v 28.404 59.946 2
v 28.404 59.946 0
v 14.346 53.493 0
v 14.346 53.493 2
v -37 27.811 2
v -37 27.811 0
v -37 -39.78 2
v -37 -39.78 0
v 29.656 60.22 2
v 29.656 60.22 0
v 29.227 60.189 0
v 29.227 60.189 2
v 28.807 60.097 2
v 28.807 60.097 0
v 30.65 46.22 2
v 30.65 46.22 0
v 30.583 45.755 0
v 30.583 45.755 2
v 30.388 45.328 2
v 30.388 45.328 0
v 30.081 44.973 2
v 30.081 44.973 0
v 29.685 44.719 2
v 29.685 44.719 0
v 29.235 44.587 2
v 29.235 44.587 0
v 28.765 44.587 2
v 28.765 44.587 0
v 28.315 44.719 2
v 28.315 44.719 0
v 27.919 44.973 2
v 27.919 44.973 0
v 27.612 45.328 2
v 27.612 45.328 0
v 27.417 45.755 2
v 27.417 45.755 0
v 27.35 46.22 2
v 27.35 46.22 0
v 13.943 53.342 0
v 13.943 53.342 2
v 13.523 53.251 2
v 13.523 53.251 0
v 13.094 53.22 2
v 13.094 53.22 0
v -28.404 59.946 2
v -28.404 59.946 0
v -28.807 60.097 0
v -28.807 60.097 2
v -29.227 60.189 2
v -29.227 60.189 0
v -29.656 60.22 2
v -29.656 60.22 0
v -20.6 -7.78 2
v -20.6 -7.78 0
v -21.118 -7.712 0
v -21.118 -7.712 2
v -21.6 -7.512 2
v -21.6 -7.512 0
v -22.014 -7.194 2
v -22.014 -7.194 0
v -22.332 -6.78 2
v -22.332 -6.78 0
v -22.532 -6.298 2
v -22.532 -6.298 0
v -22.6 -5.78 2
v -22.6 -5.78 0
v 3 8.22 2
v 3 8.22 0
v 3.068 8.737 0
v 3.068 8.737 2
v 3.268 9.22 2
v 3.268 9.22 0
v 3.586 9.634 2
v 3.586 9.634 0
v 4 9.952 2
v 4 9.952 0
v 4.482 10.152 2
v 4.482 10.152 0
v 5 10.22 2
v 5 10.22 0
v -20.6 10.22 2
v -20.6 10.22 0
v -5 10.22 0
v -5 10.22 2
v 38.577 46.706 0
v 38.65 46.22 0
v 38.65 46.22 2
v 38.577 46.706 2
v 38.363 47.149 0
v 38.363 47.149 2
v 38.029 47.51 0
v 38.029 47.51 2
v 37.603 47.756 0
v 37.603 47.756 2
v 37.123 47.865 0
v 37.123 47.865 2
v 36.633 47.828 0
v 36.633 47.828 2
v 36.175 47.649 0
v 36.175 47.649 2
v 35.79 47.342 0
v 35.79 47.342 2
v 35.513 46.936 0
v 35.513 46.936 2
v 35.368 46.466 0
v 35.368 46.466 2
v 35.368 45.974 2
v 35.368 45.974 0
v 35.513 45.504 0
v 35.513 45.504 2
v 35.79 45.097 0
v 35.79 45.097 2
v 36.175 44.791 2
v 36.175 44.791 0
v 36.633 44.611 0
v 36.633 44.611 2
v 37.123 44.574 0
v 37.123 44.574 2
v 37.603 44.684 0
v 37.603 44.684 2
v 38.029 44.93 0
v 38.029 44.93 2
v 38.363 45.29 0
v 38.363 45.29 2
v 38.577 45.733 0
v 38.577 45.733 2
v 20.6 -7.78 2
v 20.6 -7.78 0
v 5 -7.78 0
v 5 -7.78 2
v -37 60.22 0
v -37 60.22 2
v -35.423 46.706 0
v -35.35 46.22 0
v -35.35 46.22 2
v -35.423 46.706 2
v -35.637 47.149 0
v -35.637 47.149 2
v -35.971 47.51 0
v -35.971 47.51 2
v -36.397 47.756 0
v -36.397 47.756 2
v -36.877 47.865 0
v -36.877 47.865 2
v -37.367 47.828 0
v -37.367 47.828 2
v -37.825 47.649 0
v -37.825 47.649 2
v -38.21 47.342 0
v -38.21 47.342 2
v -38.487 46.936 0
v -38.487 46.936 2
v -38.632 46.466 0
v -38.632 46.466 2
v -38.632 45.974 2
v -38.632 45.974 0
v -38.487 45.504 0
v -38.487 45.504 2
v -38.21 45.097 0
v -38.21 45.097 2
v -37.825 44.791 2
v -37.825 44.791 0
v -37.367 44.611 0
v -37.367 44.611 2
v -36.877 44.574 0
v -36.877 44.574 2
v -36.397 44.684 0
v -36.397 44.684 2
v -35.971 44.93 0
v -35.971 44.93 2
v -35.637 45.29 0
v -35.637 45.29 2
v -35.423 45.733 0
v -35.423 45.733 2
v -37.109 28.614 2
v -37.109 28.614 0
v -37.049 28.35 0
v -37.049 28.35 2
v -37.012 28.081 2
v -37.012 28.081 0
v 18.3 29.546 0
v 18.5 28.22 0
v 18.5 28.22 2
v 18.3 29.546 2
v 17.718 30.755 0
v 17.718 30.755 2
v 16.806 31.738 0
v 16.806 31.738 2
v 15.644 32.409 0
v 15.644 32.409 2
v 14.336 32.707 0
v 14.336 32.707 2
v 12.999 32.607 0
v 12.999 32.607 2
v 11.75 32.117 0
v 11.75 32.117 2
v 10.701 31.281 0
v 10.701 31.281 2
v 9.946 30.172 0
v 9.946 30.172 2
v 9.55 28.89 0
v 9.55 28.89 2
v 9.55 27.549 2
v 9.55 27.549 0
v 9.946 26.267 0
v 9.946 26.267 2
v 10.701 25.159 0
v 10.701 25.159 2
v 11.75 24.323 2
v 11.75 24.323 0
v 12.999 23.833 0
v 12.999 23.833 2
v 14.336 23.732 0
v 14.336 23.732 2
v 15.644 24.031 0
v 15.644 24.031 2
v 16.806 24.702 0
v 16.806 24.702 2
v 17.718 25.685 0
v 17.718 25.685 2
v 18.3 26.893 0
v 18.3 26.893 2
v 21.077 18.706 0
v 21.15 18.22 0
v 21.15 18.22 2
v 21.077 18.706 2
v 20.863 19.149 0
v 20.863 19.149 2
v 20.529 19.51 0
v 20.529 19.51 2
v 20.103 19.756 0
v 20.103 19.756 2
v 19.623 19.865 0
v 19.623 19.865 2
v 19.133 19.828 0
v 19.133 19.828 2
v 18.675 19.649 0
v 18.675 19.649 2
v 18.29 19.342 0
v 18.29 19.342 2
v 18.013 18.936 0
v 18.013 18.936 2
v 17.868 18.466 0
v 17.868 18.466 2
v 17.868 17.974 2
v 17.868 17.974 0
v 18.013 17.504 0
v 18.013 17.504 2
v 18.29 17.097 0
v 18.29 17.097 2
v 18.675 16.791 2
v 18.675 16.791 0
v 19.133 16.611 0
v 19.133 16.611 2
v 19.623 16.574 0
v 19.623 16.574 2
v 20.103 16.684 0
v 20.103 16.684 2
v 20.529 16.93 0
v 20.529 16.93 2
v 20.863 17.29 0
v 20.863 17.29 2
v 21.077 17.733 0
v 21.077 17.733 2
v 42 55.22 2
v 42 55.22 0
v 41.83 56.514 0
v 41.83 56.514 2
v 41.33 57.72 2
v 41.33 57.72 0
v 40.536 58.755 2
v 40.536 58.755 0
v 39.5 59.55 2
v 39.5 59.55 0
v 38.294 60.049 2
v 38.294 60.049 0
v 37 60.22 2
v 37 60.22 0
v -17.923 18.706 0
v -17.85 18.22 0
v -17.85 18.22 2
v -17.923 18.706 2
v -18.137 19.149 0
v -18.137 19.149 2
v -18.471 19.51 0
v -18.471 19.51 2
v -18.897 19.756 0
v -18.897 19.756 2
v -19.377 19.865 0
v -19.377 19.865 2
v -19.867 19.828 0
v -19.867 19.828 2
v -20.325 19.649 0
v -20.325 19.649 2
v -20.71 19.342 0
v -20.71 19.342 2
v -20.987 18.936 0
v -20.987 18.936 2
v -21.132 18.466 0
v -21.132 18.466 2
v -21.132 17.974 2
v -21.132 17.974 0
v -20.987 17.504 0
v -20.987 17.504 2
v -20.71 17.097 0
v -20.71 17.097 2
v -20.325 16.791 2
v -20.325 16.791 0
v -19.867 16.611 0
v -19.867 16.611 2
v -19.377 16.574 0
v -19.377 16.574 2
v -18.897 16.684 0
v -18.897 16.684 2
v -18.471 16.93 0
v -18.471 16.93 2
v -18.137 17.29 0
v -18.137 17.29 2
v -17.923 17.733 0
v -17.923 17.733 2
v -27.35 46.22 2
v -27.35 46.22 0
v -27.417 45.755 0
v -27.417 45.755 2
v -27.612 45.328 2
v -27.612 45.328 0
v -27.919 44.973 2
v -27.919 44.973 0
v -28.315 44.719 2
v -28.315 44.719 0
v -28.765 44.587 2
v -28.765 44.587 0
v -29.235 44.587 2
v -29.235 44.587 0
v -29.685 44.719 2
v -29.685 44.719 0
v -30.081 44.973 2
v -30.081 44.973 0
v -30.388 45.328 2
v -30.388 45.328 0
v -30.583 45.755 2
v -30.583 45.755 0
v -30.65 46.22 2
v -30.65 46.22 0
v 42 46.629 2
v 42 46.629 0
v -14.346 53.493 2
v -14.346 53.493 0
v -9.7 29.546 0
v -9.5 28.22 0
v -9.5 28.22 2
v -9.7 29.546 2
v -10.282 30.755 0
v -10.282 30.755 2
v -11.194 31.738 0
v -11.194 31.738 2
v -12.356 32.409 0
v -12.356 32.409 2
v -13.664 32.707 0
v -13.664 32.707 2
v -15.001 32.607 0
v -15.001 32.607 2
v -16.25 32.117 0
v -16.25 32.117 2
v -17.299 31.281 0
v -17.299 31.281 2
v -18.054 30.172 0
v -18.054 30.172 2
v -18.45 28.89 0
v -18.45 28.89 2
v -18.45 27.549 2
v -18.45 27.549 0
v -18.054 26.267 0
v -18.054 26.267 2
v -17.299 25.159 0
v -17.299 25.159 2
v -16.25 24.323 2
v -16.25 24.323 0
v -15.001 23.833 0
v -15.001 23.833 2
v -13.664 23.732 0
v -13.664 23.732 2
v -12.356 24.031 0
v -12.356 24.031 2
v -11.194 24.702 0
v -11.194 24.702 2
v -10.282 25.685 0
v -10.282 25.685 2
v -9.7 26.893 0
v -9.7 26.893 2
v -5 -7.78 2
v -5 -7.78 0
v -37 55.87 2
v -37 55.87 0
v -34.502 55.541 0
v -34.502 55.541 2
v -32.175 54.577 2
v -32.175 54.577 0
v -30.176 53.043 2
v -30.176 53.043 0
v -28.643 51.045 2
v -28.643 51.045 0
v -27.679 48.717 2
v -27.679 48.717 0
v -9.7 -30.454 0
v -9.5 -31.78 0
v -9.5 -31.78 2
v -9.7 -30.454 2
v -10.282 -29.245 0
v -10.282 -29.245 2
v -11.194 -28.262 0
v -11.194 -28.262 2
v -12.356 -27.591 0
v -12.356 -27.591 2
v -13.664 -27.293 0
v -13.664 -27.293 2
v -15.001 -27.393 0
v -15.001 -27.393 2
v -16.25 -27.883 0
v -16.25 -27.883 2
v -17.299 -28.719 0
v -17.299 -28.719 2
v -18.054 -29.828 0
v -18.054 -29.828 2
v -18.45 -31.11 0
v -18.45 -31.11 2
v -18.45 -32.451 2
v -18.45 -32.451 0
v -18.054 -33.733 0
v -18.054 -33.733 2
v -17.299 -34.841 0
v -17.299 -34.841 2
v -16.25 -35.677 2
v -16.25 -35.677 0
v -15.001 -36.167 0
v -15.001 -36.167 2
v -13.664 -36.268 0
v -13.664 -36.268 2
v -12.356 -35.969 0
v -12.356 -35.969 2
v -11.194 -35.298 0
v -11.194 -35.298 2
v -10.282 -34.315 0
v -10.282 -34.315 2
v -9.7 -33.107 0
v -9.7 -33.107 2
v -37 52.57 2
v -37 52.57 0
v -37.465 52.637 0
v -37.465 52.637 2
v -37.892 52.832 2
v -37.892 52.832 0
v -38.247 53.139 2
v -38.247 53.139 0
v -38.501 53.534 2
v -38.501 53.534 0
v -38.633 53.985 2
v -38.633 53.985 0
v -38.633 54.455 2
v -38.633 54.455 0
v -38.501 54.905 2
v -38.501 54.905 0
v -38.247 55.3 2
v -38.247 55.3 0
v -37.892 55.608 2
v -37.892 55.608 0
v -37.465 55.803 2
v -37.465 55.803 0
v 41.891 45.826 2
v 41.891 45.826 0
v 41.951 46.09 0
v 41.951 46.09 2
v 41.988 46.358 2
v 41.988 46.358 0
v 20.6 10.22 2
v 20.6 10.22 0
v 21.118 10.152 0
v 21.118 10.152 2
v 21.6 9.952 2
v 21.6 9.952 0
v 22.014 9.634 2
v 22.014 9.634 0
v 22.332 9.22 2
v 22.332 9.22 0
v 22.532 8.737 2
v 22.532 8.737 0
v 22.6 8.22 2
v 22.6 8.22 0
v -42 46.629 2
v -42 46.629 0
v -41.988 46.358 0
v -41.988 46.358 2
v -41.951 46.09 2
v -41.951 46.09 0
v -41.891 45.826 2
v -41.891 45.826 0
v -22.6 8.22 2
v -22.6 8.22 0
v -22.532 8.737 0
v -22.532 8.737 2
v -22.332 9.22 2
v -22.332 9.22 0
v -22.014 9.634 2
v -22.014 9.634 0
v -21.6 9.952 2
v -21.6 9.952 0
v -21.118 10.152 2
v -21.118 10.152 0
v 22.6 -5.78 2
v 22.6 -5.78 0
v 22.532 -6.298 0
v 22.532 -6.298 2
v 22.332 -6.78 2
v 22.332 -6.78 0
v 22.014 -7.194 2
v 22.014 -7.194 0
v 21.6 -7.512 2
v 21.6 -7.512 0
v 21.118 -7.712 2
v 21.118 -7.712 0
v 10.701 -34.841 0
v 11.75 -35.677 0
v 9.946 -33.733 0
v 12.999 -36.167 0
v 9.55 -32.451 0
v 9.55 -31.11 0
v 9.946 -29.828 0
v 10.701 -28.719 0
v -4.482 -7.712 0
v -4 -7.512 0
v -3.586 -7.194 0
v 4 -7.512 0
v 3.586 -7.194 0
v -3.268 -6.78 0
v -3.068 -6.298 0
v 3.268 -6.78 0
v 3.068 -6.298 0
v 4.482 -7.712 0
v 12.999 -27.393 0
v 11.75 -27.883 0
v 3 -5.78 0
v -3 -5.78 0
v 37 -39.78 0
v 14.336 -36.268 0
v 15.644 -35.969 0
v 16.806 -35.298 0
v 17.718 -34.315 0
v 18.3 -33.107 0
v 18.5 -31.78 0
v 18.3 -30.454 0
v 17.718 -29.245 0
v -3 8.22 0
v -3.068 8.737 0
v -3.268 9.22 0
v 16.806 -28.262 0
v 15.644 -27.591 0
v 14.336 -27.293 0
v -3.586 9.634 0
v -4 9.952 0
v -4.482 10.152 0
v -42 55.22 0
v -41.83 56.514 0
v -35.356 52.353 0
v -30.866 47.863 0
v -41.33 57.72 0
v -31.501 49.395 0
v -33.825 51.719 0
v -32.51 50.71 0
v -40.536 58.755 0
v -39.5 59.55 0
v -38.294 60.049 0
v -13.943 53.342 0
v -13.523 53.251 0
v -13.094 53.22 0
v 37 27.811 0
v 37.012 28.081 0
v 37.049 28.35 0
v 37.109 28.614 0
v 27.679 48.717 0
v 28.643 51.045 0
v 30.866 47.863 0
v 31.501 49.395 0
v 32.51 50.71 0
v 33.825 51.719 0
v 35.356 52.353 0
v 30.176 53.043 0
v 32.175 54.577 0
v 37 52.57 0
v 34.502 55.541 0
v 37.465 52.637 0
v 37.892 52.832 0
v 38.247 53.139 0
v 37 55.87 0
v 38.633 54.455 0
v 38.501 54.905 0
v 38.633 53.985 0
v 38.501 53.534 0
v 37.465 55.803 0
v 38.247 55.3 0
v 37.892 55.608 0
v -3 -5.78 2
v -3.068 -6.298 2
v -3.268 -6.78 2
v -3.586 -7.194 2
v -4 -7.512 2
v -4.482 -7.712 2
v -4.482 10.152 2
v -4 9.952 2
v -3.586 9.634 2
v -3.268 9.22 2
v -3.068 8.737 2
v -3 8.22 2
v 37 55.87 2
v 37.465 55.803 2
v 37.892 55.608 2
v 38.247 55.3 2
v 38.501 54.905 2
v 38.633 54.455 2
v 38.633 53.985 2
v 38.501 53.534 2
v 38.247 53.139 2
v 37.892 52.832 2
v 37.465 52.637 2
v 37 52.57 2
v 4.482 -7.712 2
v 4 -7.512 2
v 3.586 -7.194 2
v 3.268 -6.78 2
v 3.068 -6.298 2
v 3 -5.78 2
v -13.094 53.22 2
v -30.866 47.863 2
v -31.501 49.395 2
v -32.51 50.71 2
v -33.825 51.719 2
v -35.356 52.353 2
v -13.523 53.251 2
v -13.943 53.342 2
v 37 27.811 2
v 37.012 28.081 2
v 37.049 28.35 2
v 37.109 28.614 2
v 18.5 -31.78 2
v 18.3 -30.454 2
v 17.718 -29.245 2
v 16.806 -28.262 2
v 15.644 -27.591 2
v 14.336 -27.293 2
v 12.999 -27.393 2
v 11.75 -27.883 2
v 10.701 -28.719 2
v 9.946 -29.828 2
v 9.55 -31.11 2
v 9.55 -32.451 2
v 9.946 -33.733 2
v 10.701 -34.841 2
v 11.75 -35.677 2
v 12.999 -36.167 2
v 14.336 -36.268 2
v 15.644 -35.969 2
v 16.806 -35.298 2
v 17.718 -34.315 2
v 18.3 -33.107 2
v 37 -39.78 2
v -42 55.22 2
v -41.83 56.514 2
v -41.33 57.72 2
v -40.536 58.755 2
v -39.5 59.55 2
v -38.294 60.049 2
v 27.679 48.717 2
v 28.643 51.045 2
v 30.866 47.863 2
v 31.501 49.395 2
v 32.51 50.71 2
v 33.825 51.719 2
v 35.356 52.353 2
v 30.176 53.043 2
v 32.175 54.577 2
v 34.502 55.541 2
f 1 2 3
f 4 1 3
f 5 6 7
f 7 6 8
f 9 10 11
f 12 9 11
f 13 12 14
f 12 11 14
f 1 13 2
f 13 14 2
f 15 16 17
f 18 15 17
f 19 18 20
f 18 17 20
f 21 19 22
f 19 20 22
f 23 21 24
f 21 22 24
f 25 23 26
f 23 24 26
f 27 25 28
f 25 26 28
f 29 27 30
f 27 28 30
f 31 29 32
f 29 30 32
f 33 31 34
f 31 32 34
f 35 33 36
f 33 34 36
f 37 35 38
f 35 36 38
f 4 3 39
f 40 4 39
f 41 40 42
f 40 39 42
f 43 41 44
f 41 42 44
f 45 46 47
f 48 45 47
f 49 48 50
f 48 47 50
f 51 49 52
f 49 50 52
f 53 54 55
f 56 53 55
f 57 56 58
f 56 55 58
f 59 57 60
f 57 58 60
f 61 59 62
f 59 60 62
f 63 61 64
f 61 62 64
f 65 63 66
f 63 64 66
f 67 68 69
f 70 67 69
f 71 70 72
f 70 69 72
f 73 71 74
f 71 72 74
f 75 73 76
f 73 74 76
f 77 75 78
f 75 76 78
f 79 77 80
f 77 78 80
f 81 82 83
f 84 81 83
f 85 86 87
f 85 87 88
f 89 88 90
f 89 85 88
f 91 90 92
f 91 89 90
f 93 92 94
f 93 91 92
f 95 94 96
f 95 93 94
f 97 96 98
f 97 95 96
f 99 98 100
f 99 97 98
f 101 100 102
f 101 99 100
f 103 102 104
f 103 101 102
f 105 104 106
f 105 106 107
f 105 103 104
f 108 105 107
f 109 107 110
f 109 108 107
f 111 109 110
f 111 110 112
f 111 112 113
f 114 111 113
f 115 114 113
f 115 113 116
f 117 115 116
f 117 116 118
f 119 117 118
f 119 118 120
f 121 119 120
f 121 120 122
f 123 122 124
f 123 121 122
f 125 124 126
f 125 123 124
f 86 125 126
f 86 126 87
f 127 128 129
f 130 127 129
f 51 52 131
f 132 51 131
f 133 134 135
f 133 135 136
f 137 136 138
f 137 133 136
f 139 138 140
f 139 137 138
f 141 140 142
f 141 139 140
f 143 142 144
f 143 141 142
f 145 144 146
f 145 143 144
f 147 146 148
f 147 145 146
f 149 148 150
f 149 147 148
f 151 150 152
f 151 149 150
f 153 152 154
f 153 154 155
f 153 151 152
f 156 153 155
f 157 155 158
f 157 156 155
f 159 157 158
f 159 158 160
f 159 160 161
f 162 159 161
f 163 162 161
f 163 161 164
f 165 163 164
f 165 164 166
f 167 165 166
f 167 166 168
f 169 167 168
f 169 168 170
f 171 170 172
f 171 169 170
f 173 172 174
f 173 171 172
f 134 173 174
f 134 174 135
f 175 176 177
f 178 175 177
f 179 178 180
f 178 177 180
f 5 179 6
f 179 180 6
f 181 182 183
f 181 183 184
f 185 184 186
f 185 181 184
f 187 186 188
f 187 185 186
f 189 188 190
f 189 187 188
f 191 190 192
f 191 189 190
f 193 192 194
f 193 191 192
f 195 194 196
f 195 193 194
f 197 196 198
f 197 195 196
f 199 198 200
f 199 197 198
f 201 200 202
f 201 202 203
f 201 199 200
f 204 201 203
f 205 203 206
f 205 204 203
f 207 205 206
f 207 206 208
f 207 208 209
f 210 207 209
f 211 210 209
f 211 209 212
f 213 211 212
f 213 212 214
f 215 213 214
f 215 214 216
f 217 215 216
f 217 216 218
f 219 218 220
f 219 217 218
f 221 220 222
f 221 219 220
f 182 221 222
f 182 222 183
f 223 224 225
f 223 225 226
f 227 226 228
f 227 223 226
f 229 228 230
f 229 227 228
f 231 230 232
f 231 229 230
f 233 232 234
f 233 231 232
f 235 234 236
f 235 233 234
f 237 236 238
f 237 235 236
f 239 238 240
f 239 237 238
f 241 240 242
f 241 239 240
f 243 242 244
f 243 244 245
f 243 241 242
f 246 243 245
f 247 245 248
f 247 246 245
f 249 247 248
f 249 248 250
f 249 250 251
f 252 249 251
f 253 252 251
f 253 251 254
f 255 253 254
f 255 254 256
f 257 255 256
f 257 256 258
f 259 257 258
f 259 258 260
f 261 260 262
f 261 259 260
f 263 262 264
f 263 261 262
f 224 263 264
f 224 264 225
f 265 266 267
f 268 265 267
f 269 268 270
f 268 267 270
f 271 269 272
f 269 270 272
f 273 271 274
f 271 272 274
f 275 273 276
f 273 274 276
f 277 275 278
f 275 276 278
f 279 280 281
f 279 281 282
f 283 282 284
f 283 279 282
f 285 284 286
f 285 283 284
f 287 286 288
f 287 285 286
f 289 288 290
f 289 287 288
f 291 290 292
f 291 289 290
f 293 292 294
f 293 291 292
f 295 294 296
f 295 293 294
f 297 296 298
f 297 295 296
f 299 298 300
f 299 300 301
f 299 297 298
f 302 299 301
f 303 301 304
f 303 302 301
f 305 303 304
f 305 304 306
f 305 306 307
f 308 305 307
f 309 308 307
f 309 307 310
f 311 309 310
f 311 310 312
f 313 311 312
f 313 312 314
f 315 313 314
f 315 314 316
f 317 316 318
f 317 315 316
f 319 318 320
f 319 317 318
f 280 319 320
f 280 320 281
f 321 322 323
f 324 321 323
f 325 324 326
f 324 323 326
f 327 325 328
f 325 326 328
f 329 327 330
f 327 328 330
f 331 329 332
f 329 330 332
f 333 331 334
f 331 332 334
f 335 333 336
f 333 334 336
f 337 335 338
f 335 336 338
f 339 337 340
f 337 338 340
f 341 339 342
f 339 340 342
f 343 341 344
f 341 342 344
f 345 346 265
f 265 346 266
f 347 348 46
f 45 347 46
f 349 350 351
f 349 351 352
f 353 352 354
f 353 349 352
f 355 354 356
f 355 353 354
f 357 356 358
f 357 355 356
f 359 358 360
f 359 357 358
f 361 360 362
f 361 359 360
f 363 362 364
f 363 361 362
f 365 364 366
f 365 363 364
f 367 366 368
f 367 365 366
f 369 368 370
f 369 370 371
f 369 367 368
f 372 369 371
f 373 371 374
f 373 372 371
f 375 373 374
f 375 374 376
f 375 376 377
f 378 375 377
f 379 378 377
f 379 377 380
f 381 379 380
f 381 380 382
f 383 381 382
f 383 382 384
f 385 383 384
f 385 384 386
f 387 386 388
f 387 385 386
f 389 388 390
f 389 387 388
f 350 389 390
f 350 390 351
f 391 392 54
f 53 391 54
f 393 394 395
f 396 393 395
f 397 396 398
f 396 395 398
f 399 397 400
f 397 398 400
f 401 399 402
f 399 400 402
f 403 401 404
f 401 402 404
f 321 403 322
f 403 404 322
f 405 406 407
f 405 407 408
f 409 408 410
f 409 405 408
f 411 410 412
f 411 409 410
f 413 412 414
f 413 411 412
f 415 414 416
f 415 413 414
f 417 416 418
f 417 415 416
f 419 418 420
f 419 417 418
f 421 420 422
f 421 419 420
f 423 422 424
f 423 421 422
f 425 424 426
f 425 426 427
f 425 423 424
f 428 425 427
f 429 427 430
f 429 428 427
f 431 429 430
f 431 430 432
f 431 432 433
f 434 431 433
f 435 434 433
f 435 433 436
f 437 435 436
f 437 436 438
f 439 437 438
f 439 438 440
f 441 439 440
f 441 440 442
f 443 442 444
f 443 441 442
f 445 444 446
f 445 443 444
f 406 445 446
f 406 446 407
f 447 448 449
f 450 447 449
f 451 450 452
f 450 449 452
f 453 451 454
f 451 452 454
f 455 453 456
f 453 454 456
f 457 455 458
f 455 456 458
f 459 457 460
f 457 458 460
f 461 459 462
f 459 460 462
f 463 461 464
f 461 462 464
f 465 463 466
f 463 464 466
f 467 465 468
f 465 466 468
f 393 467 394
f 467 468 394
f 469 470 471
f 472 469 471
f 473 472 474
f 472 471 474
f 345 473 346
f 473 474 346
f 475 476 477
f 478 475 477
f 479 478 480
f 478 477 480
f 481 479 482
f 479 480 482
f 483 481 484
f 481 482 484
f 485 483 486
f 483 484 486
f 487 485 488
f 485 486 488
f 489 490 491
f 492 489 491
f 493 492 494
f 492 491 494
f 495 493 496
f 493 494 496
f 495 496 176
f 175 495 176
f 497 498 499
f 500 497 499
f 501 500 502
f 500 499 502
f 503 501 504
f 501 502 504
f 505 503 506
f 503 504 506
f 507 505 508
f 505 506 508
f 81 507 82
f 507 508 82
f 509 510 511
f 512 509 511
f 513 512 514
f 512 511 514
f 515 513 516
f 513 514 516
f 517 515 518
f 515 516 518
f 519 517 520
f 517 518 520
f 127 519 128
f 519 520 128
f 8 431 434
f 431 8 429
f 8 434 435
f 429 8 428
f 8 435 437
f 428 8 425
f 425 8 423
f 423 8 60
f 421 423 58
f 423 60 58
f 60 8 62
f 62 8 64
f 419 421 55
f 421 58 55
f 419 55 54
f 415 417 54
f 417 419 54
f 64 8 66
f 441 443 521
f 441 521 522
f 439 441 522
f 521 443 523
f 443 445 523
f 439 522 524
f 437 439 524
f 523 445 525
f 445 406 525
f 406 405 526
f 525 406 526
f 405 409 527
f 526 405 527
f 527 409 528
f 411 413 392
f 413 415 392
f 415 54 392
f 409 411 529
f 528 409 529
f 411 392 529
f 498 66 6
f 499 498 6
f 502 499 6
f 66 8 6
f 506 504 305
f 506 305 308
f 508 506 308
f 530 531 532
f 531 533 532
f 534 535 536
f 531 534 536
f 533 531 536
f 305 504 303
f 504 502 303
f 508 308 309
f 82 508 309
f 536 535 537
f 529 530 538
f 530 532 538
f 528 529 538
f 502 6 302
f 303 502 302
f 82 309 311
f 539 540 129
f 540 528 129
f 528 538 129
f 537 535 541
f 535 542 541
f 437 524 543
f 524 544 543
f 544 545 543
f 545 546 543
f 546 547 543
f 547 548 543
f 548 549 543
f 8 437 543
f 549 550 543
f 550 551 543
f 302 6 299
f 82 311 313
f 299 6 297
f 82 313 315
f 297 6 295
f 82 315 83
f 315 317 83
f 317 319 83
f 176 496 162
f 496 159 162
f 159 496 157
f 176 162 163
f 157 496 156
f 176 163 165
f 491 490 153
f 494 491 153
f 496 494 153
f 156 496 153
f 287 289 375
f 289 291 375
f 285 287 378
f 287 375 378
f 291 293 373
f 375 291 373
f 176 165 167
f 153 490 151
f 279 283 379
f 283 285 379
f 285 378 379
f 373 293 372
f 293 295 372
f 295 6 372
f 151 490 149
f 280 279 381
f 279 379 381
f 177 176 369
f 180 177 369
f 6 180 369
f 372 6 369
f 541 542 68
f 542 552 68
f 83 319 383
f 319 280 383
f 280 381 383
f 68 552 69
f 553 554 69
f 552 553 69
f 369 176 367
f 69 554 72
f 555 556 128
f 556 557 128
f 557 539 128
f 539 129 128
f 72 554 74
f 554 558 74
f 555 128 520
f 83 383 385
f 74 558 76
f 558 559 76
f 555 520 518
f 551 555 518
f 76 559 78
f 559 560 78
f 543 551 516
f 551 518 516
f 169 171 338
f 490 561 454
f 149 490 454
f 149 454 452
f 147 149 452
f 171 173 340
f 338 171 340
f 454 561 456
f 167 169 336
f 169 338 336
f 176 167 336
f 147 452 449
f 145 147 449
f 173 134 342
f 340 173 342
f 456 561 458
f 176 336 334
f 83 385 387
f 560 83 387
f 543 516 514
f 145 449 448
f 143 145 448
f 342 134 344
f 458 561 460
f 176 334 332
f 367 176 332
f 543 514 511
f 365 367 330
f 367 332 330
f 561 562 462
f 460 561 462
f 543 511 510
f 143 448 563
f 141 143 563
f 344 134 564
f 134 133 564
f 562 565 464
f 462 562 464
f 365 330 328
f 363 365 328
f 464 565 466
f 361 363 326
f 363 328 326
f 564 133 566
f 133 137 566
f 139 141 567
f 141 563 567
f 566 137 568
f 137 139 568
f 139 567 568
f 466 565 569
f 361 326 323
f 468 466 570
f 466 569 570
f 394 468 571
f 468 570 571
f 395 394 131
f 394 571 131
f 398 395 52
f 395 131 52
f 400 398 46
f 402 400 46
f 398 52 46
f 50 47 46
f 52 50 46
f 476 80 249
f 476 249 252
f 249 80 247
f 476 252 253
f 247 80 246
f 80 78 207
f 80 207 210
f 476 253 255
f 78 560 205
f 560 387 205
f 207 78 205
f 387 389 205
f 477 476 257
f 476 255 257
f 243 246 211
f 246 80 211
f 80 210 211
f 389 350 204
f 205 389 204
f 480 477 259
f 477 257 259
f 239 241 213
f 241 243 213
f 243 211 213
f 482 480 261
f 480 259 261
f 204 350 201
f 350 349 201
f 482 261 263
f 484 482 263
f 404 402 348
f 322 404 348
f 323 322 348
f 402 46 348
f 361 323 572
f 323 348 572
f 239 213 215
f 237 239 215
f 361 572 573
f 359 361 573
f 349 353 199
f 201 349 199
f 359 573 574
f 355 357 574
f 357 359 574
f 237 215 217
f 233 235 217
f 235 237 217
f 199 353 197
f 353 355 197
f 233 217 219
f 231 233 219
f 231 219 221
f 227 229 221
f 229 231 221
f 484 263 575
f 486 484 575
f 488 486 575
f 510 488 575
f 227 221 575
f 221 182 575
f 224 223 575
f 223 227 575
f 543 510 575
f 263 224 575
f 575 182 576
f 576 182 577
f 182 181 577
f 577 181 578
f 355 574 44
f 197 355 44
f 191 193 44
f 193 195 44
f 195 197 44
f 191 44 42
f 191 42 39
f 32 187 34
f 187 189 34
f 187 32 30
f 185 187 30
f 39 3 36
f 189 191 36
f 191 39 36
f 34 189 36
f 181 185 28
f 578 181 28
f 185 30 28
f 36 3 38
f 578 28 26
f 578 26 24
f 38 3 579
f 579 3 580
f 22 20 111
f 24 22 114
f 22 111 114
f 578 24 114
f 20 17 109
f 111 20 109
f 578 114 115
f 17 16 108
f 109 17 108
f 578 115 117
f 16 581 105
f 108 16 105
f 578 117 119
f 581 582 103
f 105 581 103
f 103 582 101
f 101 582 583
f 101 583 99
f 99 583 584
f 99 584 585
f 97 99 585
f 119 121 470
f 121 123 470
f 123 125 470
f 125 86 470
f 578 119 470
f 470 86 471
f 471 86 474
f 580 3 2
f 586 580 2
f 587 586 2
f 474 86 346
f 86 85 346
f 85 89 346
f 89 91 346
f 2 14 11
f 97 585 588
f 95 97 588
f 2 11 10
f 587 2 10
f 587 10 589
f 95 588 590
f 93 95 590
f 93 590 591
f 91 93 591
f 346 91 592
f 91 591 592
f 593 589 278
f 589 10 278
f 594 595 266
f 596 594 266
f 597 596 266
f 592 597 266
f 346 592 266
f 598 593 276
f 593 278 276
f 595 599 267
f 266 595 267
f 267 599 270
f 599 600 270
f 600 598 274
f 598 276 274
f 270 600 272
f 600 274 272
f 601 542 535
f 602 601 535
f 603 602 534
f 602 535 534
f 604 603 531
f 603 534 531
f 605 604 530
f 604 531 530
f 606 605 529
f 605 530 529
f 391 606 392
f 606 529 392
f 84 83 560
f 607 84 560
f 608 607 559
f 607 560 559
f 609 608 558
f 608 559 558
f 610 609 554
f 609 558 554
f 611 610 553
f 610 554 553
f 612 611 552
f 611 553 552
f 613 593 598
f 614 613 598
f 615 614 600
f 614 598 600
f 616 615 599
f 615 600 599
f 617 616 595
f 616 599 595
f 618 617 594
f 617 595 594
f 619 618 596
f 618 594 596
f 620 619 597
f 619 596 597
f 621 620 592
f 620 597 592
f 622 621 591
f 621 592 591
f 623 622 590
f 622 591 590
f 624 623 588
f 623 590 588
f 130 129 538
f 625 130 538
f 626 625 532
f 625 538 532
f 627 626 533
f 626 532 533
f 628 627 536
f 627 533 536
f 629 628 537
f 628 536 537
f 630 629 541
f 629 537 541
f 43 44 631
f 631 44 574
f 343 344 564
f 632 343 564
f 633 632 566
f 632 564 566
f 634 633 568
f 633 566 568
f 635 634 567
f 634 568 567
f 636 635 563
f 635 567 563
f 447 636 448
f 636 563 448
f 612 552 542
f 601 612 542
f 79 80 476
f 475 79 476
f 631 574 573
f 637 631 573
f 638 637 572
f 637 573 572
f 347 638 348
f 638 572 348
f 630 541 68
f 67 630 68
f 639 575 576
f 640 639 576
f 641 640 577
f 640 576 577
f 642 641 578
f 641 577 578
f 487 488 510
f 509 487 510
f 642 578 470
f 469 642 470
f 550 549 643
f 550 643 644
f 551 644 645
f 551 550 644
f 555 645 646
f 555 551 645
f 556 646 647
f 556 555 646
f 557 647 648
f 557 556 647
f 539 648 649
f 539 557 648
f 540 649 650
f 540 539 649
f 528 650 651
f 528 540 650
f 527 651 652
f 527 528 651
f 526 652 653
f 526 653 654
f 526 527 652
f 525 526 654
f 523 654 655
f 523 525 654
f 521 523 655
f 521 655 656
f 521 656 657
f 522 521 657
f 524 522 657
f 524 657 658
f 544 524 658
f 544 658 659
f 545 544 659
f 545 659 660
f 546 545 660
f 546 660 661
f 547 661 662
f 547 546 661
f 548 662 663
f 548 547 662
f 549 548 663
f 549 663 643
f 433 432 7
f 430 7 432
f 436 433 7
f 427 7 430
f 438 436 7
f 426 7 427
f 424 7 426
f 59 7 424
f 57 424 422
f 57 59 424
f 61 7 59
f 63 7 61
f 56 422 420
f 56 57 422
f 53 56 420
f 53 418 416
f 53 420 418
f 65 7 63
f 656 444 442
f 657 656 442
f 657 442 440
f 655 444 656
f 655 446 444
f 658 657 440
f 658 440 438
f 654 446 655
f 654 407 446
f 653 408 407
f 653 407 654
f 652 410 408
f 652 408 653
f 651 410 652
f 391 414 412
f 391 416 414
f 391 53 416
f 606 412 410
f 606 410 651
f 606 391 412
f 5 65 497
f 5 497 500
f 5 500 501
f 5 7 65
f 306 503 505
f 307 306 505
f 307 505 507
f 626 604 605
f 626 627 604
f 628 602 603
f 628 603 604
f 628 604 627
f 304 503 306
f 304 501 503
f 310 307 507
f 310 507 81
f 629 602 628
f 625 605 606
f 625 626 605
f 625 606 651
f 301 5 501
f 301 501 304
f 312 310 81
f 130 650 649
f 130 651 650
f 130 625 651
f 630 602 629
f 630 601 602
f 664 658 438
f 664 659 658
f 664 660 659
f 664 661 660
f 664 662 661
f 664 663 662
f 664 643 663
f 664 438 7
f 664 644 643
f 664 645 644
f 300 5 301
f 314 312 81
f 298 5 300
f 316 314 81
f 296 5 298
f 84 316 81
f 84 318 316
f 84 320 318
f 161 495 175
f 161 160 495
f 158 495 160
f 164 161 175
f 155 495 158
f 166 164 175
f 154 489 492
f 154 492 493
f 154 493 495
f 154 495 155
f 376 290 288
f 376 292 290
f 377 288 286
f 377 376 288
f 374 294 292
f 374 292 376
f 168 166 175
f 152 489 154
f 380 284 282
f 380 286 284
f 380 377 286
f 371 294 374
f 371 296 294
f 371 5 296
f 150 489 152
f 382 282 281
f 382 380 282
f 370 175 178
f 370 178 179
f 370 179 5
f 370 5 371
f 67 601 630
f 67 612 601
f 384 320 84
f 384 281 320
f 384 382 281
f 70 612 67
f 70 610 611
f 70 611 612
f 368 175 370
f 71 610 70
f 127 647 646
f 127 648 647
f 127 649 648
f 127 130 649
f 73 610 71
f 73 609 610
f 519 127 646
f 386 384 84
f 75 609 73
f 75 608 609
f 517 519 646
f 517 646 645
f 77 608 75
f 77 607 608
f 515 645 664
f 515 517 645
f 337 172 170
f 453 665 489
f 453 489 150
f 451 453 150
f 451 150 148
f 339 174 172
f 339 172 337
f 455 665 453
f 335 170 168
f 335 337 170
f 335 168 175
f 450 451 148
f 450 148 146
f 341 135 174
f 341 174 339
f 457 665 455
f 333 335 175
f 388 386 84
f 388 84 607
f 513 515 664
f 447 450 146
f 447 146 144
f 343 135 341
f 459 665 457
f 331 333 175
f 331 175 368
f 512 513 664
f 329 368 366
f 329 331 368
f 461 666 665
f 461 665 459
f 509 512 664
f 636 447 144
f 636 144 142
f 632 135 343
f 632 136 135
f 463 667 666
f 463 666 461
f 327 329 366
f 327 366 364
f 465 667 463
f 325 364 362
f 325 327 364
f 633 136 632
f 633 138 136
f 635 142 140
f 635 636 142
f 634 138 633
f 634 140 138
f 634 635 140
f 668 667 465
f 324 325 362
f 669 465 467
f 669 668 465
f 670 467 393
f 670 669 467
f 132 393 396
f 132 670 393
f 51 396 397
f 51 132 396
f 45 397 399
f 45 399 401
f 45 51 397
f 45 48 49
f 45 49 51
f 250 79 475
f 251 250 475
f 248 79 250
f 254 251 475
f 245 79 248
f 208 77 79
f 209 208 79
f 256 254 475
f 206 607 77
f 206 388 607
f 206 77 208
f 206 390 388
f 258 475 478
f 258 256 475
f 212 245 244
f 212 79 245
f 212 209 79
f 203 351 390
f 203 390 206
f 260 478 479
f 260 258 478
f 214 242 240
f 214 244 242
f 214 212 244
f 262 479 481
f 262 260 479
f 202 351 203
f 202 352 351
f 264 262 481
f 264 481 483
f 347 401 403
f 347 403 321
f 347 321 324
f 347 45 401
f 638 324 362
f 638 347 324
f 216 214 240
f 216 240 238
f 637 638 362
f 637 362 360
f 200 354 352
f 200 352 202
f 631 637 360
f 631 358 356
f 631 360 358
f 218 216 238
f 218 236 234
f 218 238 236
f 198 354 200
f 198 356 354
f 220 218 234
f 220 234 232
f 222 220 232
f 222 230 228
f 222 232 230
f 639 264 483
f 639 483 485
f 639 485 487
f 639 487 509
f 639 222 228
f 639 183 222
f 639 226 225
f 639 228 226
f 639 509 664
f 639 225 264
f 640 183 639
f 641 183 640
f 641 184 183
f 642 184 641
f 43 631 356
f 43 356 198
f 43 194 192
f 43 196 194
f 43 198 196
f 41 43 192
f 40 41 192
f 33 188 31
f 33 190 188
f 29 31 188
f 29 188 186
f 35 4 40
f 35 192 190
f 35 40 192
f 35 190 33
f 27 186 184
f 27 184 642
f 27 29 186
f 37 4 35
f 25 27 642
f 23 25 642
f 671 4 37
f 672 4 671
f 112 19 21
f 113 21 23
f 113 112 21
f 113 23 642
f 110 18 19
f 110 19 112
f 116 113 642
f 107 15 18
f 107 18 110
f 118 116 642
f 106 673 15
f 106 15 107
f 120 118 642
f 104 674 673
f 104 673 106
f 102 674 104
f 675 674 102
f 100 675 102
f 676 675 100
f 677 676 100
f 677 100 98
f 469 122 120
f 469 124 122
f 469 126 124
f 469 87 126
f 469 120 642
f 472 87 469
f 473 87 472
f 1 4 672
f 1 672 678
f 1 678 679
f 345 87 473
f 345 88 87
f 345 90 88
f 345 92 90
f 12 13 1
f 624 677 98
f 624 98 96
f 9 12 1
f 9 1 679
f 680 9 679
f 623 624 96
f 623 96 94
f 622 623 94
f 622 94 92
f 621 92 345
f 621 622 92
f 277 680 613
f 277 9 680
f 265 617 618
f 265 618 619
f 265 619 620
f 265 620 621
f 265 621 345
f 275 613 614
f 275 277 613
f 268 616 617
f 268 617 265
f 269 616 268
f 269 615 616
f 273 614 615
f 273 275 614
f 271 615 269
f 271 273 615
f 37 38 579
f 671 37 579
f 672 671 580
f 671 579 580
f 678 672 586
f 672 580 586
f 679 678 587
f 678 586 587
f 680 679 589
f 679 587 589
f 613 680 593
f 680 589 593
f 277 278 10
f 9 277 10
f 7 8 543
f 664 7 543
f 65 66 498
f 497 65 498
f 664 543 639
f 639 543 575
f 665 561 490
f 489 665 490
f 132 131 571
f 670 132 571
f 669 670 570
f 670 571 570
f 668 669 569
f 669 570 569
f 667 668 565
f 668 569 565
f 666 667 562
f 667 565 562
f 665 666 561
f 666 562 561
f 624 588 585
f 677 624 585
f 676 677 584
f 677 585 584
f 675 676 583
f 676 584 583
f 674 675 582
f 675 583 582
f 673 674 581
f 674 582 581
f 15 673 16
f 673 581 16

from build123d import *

# Parameters (mm, degrees)
F0_R     = 4.5
F0_R_2   = 1.65
F1_DEPTH = 2


with BuildPart() as f1:
    # F0 (on Top) → F1 (new body)
    with BuildSketch(Plane.XY):
        with BuildLine():
            Line((-29.655639, 60.219758), (-37, 60.219758))
            ThreePointArc((-37, 60.219758), (-40.535534, 58.755292), (-42, 55.219758))
            Line((-42, 55.219758), (-42, 46.628683))
            ThreePointArc((-42, 46.628683), (-41.972513, 46.223505), (-41.890554, 45.825751))
            Line((-41.890554, 45.825751), (-37.109446, 28.613764))
            ThreePointArc((-37.109446, 28.613764), (-37.027487, 28.216011), (-37, 27.810833))
            Line((-37, 27.810833), (-37, -39.780242))
            Line((-37, -39.780242), (37, -39.780242))
            Line((37, -39.780242), (37, 27.810833))
            ThreePointArc((37, 27.810833), (37.027487, 28.216011), (37.109446, 28.613764))
            Line((37.109446, 28.613764), (41.890554, 45.825751))
            ThreePointArc((41.890554, 45.825751), (41.972513, 46.223505), (42, 46.628683))
            Line((42, 46.628683), (42, 55.219758))
            ThreePointArc((42, 55.219758), (40.535534, 58.755292), (37, 60.219758))
            Line((37, 60.219758), (29.655639, 60.219758))
            ThreePointArc((29.655639, 60.219758), (29.015118, 60.150582), (28.404136, 59.946246))
            Line((28.404136, 59.946246), (14.345864, 53.493269))
            ThreePointArc((14.345864, 53.493269), (13.734882, 53.288933), (13.094361, 53.219758))
            Line((13.094361, 53.219758), (0, 53.219758))
            Line((0, 53.219758), (-13.094361, 53.219758))
            ThreePointArc((-13.094361, 53.219758), (-13.734882, 53.288933), (-14.345864, 53.493269))
            Line((-14.345864, 53.493269), (-28.404136, 59.946246))
            ThreePointArc((-28.404136, 59.946246), (-29.015118, 60.150582), (-29.655639, 60.219758))
        make_face()
        with Locations((-14, -31.780242)):
            Circle(F0_R, mode=Mode.SUBTRACT)
        with BuildLine():
            ThreePointArc((-5, 10.219758), (-3.585786, 9.633971), (-3, 8.219758))
            Line((-3, 8.219758), (-3, -5.780242))
            ThreePointArc((-3, -5.780242), (-3.585786, -7.194456), (-5, -7.780242))
            Line((-5, -7.780242), (-20.6, -7.780242))
            ThreePointArc((-20.6, -7.780242), (-22.014214, -7.194456), (-22.6, -5.780242))
            Line((-22.6, -5.780242), (-22.6, 8.219758))
            ThreePointArc((-22.6, 8.219758), (-22.014214, 9.633971), (-20.6, 10.219758))
            Line((-20.6, 10.219758), (-5, 10.219758))
        make_face(mode=Mode.SUBTRACT)
        with Locations((14, -31.780242)):
            Circle(F0_R, mode=Mode.SUBTRACT)
        with BuildLine():
            Line((3, -5.780242), (3, 8.219758))
            ThreePointArc((3, 8.219758), (3.585786, 9.633971), (5, 10.219758))
            Line((5, 10.219758), (20.6, 10.219758))
            ThreePointArc((20.6, 10.219758), (22.014214, 9.633971), (22.6, 8.219758))
            Line((22.6, 8.219758), (22.6, -5.780242))
            ThreePointArc((22.6, -5.780242), (22.014214, -7.194456), (20.6, -7.780242))
            Line((20.6, -7.780242), (5, -7.780242))
            ThreePointArc((5, -7.780242), (3.585786, -7.194456), (3, -5.780242))
        make_face(mode=Mode.SUBTRACT)
        with Locations((-19.5, 18.219758)):
            Circle(F0_R_2, mode=Mode.SUBTRACT)
        with Locations((-14, 28.219758)):
            Circle(F0_R, mode=Mode.SUBTRACT)
        with Locations((-37, 46.219758)):
            Circle(F0_R_2, mode=Mode.SUBTRACT)
        with BuildLine():
            ThreePointArc((-37, 55.869758), (-30.17642, 53.043338), (-27.35, 46.219758))
            ThreePointArc((-27.35, 46.219758), (-29, 44.569758), (-30.65, 46.219758))
            ThreePointArc((-30.65, 46.219758), (-32.509872, 50.709886), (-37, 52.569758))
            ThreePointArc((-37, 52.569758), (-38.65, 54.219758), (-37, 55.869758))
        make_face(mode=Mode.SUBTRACT)
        with Locations((19.5, 18.219758)):
            Circle(F0_R_2, mode=Mode.SUBTRACT)
        with Locations((14, 28.219758)):
            Circle(F0_R, mode=Mode.SUBTRACT)
        with Locations((37, 46.219758)):
            Circle(F0_R_2, mode=Mode.SUBTRACT)
        with BuildLine():
            ThreePointArc((30.65, 46.219758), (29, 44.569758), (27.35, 46.219758))
            ThreePointArc((27.35, 46.219758), (30.17642, 53.043338), (37, 55.869758))
            ThreePointArc((37, 55.869758), (38.65, 54.219758), (37, 52.569758))
            ThreePointArc((37, 52.569758), (32.509872, 50.709886), (30.65, 46.219758))
        make_face(mode=Mode.SUBTRACT)
    extrude(amount=F1_DEPTH)


solid = f1.part
